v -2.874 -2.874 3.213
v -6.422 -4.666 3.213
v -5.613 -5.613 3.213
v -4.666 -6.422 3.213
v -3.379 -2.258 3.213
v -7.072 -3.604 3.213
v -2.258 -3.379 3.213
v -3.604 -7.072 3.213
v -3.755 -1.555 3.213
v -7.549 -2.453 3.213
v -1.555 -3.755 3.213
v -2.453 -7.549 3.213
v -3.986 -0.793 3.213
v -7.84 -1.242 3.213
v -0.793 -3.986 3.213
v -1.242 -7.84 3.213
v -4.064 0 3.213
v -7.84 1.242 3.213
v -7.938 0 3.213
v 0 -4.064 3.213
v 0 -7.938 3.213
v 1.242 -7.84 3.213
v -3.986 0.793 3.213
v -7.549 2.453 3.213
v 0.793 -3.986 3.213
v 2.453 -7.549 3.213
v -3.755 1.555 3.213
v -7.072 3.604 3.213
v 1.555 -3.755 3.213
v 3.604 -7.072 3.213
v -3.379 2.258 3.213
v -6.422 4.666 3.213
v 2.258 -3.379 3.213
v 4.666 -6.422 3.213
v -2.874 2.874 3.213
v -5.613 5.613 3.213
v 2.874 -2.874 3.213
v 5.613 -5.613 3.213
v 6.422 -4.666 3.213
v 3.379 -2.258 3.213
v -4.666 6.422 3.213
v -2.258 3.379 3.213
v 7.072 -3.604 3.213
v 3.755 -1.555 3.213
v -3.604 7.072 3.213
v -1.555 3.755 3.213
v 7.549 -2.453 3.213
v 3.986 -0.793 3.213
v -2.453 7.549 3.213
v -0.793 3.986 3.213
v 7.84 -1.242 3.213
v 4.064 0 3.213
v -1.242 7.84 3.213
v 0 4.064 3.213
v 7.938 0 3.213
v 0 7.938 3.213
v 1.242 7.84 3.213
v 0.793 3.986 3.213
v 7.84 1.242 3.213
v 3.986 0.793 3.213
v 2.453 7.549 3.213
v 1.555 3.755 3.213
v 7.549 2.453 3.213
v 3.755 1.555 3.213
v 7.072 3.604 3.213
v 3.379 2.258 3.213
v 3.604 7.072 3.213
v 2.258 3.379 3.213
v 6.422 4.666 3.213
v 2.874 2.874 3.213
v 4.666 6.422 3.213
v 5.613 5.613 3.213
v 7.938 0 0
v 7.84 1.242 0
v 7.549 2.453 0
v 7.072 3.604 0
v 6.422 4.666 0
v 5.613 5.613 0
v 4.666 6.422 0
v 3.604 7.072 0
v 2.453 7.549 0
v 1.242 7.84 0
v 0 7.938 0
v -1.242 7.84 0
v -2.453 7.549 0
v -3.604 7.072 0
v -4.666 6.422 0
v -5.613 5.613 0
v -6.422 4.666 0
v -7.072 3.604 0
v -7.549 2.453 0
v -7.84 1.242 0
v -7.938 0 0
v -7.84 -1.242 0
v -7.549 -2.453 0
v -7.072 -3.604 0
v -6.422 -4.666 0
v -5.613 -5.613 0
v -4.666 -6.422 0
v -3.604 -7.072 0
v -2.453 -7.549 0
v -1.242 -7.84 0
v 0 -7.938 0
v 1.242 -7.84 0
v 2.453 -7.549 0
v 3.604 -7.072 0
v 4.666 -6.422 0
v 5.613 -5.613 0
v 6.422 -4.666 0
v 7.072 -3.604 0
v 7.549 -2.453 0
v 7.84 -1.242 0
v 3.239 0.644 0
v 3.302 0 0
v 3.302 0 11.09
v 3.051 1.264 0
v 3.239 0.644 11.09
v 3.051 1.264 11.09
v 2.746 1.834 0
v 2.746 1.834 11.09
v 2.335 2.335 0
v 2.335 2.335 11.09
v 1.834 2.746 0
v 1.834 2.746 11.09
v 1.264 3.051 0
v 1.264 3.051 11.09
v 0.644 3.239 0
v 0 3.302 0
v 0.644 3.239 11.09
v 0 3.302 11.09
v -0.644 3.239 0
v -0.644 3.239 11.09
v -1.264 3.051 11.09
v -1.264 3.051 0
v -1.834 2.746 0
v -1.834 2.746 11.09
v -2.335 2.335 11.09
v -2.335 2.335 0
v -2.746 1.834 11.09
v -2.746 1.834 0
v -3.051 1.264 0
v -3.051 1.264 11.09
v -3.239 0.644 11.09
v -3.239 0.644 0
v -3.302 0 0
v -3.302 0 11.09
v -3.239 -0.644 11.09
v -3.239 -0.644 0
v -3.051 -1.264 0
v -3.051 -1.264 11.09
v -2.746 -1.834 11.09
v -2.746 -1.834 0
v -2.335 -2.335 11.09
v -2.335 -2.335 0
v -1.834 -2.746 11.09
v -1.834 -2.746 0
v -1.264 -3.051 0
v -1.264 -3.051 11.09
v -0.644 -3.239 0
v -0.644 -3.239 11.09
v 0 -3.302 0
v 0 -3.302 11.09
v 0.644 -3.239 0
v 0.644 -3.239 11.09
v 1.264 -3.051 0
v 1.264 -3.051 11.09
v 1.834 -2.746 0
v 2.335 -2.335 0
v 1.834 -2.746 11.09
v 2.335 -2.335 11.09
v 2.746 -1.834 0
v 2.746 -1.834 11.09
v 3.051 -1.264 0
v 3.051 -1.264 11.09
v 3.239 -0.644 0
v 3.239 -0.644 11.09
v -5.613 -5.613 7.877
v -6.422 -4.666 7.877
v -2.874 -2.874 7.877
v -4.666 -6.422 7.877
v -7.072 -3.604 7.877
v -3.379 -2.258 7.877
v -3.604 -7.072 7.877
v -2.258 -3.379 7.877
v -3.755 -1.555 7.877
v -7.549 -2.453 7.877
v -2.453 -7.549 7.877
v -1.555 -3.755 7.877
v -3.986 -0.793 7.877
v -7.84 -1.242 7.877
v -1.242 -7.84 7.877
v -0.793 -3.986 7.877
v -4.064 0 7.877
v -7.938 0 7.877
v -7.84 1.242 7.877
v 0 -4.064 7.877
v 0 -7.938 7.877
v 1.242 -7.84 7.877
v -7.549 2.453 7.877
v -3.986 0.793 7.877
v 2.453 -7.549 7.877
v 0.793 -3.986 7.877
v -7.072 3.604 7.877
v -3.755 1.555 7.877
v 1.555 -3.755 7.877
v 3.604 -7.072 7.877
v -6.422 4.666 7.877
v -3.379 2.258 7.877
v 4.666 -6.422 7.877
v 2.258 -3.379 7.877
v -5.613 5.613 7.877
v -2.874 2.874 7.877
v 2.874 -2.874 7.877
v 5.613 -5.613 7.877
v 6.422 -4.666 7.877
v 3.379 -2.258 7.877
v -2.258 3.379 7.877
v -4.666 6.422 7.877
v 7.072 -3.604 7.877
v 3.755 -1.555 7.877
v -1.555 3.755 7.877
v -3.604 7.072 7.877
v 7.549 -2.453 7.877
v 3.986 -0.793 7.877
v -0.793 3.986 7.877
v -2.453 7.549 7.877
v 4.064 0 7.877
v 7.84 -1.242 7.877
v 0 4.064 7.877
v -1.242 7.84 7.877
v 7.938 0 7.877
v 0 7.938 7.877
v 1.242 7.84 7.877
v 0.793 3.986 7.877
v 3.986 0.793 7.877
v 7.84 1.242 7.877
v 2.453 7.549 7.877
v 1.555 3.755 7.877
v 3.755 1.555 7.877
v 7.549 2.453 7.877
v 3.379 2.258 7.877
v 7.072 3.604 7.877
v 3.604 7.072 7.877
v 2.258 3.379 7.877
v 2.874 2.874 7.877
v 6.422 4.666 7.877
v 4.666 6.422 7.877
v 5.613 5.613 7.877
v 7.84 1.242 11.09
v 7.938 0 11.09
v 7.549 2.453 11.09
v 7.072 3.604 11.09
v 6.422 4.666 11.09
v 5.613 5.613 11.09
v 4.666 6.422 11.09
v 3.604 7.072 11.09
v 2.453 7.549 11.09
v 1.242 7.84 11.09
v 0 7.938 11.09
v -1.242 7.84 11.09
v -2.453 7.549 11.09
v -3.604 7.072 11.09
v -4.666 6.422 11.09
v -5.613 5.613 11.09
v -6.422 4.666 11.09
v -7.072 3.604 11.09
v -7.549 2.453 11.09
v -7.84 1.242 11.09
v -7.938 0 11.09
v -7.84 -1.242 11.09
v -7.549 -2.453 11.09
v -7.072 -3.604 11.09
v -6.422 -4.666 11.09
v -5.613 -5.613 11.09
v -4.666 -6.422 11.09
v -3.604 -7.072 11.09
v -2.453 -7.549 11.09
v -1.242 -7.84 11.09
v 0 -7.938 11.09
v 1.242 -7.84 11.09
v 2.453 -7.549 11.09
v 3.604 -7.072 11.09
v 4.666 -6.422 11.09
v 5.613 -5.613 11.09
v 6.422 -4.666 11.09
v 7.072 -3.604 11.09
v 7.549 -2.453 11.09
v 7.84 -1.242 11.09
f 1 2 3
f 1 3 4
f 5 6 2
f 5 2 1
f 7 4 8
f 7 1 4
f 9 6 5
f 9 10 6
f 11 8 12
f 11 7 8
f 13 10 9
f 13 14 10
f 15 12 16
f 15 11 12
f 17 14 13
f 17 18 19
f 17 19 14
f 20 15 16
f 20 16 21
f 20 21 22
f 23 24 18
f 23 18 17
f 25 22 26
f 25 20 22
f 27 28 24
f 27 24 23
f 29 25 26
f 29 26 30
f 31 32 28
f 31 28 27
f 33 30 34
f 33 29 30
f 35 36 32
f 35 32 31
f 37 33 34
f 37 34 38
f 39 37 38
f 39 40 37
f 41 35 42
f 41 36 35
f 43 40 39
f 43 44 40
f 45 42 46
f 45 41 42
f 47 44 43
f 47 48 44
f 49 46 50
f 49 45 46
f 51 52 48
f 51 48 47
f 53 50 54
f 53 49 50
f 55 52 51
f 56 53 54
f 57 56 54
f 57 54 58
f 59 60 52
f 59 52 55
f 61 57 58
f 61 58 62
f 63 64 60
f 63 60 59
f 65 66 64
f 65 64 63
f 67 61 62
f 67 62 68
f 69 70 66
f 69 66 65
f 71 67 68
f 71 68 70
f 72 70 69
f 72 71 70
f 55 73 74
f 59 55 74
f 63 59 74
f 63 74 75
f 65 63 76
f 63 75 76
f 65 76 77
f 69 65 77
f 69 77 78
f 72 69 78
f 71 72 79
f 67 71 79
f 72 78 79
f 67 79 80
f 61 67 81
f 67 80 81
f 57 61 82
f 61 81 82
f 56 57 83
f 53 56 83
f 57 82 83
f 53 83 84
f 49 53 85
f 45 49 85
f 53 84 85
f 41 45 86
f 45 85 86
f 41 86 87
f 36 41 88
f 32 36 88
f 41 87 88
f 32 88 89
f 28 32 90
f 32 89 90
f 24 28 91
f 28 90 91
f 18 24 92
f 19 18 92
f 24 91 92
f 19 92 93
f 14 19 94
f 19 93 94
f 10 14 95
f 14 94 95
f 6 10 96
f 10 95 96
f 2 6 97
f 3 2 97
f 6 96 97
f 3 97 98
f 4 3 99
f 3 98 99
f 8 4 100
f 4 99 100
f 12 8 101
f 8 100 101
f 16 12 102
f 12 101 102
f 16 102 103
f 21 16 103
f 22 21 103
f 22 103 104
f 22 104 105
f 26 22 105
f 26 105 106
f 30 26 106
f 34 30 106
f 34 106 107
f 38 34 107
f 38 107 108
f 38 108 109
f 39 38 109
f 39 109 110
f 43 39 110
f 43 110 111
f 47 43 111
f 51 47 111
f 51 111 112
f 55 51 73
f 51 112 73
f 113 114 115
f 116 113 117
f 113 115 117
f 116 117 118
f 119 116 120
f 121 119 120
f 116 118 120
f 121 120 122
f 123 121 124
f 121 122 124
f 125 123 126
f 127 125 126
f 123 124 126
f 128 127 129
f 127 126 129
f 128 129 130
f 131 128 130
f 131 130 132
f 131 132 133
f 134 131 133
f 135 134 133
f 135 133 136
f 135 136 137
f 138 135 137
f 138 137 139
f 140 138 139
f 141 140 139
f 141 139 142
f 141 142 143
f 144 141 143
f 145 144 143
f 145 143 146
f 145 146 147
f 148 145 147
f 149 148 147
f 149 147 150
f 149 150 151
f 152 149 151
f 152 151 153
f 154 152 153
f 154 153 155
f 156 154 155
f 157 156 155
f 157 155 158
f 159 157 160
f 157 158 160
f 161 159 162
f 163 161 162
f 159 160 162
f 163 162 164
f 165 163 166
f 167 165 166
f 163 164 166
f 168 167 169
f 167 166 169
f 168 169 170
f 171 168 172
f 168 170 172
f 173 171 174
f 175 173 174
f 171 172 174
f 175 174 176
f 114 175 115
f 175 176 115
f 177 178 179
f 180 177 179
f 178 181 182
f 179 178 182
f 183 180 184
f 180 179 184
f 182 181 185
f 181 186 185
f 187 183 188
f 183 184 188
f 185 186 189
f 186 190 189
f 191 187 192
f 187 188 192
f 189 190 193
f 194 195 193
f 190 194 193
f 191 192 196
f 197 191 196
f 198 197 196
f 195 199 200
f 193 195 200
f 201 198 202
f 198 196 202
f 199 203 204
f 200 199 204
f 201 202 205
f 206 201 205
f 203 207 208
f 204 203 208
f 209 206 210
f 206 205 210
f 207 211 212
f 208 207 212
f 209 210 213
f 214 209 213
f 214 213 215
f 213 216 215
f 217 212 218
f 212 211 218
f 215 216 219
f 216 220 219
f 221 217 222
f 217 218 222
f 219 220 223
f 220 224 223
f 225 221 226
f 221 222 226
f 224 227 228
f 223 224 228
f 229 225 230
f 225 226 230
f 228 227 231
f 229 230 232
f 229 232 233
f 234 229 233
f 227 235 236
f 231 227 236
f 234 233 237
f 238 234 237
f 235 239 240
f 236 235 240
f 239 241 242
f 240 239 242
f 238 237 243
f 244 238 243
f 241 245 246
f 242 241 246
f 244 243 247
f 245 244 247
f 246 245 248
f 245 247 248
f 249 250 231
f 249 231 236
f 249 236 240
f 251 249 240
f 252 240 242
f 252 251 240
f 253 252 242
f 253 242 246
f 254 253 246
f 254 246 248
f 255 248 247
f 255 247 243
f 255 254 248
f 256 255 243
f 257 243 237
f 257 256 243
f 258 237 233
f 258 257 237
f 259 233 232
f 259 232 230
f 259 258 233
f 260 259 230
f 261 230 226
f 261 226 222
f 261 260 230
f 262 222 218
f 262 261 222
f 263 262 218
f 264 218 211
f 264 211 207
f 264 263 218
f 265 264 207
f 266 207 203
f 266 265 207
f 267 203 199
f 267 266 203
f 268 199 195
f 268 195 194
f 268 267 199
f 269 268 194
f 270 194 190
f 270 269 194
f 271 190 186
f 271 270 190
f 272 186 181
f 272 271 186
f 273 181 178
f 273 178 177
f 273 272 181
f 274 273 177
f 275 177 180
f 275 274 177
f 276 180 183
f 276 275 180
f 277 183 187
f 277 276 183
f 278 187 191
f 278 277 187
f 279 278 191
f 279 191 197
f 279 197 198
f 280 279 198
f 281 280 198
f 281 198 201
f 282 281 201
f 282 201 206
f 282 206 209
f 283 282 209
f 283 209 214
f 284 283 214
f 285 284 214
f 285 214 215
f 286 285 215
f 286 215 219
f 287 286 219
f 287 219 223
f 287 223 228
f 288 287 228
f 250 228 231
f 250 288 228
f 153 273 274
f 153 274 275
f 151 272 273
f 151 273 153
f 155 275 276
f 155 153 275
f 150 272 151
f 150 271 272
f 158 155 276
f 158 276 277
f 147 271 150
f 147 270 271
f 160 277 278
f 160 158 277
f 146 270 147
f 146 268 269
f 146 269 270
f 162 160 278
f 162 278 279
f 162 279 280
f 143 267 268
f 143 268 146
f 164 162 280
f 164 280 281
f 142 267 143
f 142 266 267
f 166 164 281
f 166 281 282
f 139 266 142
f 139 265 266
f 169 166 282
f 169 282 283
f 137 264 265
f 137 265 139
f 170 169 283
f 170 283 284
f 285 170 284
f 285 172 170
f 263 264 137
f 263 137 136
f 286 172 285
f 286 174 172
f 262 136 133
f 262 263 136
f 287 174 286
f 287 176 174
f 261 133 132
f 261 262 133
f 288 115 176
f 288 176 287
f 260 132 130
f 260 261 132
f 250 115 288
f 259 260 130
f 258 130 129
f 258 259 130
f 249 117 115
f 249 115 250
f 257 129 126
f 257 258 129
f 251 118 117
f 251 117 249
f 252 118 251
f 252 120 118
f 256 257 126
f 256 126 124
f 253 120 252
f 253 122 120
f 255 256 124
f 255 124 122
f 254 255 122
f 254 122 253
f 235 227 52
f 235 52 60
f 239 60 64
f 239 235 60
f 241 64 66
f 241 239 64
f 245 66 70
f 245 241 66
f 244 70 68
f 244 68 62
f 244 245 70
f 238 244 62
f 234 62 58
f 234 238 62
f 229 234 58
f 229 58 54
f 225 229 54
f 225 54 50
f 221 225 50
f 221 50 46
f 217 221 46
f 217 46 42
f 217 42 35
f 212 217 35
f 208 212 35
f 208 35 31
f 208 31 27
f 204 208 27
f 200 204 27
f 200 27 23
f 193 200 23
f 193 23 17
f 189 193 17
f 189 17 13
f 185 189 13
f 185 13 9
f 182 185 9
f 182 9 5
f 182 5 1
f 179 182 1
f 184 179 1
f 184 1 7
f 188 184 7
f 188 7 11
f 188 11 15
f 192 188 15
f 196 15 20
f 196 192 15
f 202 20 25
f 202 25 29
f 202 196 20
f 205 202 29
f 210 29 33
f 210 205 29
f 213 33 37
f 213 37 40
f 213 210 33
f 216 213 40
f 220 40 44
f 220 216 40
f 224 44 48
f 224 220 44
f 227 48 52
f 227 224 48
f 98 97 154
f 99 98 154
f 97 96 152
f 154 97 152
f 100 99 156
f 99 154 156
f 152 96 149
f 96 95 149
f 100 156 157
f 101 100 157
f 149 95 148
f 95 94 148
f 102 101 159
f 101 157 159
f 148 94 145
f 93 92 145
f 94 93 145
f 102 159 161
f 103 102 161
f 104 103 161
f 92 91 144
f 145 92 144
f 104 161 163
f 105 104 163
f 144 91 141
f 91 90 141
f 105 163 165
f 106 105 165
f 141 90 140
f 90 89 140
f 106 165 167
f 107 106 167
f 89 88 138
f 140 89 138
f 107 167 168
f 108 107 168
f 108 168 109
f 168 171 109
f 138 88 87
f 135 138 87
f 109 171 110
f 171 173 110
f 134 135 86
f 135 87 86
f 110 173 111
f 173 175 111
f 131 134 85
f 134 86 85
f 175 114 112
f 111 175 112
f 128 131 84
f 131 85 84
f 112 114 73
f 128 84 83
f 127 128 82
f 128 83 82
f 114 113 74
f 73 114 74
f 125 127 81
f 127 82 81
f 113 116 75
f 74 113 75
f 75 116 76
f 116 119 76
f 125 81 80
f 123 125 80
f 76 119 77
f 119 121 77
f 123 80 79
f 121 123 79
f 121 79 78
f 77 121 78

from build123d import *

# Parameters (mm, degrees)
F0_R     = 4.064
F0_R_2   = 3.302
F1_DEPTH = 5.54482
F0_R_3   = 7.9375
F2_DEPTH = 3.2131


with BuildPart() as f1:
    # F0 (on Top) → F1 (new body)
    with BuildSketch(Plane.XY):
        Circle(F0_R)
        Circle(F0_R_2, mode=Mode.SUBTRACT)
    extrude(amount=F1_DEPTH)

    # F0 (on Top) → F2 (join)
    with BuildSketch(Plane.XY):
        Circle(F0_R_3)
        Circle(F0_R, mode=Mode.SUBTRACT)
    extrude(amount=F2_DEPTH)

    # F3: F1 across face


with BuildPart() as f1_1:
    add(f1.part)
    add(f1.part.mirror(Plane.XY.offset(5.54482)))


solid = f1_1.part
